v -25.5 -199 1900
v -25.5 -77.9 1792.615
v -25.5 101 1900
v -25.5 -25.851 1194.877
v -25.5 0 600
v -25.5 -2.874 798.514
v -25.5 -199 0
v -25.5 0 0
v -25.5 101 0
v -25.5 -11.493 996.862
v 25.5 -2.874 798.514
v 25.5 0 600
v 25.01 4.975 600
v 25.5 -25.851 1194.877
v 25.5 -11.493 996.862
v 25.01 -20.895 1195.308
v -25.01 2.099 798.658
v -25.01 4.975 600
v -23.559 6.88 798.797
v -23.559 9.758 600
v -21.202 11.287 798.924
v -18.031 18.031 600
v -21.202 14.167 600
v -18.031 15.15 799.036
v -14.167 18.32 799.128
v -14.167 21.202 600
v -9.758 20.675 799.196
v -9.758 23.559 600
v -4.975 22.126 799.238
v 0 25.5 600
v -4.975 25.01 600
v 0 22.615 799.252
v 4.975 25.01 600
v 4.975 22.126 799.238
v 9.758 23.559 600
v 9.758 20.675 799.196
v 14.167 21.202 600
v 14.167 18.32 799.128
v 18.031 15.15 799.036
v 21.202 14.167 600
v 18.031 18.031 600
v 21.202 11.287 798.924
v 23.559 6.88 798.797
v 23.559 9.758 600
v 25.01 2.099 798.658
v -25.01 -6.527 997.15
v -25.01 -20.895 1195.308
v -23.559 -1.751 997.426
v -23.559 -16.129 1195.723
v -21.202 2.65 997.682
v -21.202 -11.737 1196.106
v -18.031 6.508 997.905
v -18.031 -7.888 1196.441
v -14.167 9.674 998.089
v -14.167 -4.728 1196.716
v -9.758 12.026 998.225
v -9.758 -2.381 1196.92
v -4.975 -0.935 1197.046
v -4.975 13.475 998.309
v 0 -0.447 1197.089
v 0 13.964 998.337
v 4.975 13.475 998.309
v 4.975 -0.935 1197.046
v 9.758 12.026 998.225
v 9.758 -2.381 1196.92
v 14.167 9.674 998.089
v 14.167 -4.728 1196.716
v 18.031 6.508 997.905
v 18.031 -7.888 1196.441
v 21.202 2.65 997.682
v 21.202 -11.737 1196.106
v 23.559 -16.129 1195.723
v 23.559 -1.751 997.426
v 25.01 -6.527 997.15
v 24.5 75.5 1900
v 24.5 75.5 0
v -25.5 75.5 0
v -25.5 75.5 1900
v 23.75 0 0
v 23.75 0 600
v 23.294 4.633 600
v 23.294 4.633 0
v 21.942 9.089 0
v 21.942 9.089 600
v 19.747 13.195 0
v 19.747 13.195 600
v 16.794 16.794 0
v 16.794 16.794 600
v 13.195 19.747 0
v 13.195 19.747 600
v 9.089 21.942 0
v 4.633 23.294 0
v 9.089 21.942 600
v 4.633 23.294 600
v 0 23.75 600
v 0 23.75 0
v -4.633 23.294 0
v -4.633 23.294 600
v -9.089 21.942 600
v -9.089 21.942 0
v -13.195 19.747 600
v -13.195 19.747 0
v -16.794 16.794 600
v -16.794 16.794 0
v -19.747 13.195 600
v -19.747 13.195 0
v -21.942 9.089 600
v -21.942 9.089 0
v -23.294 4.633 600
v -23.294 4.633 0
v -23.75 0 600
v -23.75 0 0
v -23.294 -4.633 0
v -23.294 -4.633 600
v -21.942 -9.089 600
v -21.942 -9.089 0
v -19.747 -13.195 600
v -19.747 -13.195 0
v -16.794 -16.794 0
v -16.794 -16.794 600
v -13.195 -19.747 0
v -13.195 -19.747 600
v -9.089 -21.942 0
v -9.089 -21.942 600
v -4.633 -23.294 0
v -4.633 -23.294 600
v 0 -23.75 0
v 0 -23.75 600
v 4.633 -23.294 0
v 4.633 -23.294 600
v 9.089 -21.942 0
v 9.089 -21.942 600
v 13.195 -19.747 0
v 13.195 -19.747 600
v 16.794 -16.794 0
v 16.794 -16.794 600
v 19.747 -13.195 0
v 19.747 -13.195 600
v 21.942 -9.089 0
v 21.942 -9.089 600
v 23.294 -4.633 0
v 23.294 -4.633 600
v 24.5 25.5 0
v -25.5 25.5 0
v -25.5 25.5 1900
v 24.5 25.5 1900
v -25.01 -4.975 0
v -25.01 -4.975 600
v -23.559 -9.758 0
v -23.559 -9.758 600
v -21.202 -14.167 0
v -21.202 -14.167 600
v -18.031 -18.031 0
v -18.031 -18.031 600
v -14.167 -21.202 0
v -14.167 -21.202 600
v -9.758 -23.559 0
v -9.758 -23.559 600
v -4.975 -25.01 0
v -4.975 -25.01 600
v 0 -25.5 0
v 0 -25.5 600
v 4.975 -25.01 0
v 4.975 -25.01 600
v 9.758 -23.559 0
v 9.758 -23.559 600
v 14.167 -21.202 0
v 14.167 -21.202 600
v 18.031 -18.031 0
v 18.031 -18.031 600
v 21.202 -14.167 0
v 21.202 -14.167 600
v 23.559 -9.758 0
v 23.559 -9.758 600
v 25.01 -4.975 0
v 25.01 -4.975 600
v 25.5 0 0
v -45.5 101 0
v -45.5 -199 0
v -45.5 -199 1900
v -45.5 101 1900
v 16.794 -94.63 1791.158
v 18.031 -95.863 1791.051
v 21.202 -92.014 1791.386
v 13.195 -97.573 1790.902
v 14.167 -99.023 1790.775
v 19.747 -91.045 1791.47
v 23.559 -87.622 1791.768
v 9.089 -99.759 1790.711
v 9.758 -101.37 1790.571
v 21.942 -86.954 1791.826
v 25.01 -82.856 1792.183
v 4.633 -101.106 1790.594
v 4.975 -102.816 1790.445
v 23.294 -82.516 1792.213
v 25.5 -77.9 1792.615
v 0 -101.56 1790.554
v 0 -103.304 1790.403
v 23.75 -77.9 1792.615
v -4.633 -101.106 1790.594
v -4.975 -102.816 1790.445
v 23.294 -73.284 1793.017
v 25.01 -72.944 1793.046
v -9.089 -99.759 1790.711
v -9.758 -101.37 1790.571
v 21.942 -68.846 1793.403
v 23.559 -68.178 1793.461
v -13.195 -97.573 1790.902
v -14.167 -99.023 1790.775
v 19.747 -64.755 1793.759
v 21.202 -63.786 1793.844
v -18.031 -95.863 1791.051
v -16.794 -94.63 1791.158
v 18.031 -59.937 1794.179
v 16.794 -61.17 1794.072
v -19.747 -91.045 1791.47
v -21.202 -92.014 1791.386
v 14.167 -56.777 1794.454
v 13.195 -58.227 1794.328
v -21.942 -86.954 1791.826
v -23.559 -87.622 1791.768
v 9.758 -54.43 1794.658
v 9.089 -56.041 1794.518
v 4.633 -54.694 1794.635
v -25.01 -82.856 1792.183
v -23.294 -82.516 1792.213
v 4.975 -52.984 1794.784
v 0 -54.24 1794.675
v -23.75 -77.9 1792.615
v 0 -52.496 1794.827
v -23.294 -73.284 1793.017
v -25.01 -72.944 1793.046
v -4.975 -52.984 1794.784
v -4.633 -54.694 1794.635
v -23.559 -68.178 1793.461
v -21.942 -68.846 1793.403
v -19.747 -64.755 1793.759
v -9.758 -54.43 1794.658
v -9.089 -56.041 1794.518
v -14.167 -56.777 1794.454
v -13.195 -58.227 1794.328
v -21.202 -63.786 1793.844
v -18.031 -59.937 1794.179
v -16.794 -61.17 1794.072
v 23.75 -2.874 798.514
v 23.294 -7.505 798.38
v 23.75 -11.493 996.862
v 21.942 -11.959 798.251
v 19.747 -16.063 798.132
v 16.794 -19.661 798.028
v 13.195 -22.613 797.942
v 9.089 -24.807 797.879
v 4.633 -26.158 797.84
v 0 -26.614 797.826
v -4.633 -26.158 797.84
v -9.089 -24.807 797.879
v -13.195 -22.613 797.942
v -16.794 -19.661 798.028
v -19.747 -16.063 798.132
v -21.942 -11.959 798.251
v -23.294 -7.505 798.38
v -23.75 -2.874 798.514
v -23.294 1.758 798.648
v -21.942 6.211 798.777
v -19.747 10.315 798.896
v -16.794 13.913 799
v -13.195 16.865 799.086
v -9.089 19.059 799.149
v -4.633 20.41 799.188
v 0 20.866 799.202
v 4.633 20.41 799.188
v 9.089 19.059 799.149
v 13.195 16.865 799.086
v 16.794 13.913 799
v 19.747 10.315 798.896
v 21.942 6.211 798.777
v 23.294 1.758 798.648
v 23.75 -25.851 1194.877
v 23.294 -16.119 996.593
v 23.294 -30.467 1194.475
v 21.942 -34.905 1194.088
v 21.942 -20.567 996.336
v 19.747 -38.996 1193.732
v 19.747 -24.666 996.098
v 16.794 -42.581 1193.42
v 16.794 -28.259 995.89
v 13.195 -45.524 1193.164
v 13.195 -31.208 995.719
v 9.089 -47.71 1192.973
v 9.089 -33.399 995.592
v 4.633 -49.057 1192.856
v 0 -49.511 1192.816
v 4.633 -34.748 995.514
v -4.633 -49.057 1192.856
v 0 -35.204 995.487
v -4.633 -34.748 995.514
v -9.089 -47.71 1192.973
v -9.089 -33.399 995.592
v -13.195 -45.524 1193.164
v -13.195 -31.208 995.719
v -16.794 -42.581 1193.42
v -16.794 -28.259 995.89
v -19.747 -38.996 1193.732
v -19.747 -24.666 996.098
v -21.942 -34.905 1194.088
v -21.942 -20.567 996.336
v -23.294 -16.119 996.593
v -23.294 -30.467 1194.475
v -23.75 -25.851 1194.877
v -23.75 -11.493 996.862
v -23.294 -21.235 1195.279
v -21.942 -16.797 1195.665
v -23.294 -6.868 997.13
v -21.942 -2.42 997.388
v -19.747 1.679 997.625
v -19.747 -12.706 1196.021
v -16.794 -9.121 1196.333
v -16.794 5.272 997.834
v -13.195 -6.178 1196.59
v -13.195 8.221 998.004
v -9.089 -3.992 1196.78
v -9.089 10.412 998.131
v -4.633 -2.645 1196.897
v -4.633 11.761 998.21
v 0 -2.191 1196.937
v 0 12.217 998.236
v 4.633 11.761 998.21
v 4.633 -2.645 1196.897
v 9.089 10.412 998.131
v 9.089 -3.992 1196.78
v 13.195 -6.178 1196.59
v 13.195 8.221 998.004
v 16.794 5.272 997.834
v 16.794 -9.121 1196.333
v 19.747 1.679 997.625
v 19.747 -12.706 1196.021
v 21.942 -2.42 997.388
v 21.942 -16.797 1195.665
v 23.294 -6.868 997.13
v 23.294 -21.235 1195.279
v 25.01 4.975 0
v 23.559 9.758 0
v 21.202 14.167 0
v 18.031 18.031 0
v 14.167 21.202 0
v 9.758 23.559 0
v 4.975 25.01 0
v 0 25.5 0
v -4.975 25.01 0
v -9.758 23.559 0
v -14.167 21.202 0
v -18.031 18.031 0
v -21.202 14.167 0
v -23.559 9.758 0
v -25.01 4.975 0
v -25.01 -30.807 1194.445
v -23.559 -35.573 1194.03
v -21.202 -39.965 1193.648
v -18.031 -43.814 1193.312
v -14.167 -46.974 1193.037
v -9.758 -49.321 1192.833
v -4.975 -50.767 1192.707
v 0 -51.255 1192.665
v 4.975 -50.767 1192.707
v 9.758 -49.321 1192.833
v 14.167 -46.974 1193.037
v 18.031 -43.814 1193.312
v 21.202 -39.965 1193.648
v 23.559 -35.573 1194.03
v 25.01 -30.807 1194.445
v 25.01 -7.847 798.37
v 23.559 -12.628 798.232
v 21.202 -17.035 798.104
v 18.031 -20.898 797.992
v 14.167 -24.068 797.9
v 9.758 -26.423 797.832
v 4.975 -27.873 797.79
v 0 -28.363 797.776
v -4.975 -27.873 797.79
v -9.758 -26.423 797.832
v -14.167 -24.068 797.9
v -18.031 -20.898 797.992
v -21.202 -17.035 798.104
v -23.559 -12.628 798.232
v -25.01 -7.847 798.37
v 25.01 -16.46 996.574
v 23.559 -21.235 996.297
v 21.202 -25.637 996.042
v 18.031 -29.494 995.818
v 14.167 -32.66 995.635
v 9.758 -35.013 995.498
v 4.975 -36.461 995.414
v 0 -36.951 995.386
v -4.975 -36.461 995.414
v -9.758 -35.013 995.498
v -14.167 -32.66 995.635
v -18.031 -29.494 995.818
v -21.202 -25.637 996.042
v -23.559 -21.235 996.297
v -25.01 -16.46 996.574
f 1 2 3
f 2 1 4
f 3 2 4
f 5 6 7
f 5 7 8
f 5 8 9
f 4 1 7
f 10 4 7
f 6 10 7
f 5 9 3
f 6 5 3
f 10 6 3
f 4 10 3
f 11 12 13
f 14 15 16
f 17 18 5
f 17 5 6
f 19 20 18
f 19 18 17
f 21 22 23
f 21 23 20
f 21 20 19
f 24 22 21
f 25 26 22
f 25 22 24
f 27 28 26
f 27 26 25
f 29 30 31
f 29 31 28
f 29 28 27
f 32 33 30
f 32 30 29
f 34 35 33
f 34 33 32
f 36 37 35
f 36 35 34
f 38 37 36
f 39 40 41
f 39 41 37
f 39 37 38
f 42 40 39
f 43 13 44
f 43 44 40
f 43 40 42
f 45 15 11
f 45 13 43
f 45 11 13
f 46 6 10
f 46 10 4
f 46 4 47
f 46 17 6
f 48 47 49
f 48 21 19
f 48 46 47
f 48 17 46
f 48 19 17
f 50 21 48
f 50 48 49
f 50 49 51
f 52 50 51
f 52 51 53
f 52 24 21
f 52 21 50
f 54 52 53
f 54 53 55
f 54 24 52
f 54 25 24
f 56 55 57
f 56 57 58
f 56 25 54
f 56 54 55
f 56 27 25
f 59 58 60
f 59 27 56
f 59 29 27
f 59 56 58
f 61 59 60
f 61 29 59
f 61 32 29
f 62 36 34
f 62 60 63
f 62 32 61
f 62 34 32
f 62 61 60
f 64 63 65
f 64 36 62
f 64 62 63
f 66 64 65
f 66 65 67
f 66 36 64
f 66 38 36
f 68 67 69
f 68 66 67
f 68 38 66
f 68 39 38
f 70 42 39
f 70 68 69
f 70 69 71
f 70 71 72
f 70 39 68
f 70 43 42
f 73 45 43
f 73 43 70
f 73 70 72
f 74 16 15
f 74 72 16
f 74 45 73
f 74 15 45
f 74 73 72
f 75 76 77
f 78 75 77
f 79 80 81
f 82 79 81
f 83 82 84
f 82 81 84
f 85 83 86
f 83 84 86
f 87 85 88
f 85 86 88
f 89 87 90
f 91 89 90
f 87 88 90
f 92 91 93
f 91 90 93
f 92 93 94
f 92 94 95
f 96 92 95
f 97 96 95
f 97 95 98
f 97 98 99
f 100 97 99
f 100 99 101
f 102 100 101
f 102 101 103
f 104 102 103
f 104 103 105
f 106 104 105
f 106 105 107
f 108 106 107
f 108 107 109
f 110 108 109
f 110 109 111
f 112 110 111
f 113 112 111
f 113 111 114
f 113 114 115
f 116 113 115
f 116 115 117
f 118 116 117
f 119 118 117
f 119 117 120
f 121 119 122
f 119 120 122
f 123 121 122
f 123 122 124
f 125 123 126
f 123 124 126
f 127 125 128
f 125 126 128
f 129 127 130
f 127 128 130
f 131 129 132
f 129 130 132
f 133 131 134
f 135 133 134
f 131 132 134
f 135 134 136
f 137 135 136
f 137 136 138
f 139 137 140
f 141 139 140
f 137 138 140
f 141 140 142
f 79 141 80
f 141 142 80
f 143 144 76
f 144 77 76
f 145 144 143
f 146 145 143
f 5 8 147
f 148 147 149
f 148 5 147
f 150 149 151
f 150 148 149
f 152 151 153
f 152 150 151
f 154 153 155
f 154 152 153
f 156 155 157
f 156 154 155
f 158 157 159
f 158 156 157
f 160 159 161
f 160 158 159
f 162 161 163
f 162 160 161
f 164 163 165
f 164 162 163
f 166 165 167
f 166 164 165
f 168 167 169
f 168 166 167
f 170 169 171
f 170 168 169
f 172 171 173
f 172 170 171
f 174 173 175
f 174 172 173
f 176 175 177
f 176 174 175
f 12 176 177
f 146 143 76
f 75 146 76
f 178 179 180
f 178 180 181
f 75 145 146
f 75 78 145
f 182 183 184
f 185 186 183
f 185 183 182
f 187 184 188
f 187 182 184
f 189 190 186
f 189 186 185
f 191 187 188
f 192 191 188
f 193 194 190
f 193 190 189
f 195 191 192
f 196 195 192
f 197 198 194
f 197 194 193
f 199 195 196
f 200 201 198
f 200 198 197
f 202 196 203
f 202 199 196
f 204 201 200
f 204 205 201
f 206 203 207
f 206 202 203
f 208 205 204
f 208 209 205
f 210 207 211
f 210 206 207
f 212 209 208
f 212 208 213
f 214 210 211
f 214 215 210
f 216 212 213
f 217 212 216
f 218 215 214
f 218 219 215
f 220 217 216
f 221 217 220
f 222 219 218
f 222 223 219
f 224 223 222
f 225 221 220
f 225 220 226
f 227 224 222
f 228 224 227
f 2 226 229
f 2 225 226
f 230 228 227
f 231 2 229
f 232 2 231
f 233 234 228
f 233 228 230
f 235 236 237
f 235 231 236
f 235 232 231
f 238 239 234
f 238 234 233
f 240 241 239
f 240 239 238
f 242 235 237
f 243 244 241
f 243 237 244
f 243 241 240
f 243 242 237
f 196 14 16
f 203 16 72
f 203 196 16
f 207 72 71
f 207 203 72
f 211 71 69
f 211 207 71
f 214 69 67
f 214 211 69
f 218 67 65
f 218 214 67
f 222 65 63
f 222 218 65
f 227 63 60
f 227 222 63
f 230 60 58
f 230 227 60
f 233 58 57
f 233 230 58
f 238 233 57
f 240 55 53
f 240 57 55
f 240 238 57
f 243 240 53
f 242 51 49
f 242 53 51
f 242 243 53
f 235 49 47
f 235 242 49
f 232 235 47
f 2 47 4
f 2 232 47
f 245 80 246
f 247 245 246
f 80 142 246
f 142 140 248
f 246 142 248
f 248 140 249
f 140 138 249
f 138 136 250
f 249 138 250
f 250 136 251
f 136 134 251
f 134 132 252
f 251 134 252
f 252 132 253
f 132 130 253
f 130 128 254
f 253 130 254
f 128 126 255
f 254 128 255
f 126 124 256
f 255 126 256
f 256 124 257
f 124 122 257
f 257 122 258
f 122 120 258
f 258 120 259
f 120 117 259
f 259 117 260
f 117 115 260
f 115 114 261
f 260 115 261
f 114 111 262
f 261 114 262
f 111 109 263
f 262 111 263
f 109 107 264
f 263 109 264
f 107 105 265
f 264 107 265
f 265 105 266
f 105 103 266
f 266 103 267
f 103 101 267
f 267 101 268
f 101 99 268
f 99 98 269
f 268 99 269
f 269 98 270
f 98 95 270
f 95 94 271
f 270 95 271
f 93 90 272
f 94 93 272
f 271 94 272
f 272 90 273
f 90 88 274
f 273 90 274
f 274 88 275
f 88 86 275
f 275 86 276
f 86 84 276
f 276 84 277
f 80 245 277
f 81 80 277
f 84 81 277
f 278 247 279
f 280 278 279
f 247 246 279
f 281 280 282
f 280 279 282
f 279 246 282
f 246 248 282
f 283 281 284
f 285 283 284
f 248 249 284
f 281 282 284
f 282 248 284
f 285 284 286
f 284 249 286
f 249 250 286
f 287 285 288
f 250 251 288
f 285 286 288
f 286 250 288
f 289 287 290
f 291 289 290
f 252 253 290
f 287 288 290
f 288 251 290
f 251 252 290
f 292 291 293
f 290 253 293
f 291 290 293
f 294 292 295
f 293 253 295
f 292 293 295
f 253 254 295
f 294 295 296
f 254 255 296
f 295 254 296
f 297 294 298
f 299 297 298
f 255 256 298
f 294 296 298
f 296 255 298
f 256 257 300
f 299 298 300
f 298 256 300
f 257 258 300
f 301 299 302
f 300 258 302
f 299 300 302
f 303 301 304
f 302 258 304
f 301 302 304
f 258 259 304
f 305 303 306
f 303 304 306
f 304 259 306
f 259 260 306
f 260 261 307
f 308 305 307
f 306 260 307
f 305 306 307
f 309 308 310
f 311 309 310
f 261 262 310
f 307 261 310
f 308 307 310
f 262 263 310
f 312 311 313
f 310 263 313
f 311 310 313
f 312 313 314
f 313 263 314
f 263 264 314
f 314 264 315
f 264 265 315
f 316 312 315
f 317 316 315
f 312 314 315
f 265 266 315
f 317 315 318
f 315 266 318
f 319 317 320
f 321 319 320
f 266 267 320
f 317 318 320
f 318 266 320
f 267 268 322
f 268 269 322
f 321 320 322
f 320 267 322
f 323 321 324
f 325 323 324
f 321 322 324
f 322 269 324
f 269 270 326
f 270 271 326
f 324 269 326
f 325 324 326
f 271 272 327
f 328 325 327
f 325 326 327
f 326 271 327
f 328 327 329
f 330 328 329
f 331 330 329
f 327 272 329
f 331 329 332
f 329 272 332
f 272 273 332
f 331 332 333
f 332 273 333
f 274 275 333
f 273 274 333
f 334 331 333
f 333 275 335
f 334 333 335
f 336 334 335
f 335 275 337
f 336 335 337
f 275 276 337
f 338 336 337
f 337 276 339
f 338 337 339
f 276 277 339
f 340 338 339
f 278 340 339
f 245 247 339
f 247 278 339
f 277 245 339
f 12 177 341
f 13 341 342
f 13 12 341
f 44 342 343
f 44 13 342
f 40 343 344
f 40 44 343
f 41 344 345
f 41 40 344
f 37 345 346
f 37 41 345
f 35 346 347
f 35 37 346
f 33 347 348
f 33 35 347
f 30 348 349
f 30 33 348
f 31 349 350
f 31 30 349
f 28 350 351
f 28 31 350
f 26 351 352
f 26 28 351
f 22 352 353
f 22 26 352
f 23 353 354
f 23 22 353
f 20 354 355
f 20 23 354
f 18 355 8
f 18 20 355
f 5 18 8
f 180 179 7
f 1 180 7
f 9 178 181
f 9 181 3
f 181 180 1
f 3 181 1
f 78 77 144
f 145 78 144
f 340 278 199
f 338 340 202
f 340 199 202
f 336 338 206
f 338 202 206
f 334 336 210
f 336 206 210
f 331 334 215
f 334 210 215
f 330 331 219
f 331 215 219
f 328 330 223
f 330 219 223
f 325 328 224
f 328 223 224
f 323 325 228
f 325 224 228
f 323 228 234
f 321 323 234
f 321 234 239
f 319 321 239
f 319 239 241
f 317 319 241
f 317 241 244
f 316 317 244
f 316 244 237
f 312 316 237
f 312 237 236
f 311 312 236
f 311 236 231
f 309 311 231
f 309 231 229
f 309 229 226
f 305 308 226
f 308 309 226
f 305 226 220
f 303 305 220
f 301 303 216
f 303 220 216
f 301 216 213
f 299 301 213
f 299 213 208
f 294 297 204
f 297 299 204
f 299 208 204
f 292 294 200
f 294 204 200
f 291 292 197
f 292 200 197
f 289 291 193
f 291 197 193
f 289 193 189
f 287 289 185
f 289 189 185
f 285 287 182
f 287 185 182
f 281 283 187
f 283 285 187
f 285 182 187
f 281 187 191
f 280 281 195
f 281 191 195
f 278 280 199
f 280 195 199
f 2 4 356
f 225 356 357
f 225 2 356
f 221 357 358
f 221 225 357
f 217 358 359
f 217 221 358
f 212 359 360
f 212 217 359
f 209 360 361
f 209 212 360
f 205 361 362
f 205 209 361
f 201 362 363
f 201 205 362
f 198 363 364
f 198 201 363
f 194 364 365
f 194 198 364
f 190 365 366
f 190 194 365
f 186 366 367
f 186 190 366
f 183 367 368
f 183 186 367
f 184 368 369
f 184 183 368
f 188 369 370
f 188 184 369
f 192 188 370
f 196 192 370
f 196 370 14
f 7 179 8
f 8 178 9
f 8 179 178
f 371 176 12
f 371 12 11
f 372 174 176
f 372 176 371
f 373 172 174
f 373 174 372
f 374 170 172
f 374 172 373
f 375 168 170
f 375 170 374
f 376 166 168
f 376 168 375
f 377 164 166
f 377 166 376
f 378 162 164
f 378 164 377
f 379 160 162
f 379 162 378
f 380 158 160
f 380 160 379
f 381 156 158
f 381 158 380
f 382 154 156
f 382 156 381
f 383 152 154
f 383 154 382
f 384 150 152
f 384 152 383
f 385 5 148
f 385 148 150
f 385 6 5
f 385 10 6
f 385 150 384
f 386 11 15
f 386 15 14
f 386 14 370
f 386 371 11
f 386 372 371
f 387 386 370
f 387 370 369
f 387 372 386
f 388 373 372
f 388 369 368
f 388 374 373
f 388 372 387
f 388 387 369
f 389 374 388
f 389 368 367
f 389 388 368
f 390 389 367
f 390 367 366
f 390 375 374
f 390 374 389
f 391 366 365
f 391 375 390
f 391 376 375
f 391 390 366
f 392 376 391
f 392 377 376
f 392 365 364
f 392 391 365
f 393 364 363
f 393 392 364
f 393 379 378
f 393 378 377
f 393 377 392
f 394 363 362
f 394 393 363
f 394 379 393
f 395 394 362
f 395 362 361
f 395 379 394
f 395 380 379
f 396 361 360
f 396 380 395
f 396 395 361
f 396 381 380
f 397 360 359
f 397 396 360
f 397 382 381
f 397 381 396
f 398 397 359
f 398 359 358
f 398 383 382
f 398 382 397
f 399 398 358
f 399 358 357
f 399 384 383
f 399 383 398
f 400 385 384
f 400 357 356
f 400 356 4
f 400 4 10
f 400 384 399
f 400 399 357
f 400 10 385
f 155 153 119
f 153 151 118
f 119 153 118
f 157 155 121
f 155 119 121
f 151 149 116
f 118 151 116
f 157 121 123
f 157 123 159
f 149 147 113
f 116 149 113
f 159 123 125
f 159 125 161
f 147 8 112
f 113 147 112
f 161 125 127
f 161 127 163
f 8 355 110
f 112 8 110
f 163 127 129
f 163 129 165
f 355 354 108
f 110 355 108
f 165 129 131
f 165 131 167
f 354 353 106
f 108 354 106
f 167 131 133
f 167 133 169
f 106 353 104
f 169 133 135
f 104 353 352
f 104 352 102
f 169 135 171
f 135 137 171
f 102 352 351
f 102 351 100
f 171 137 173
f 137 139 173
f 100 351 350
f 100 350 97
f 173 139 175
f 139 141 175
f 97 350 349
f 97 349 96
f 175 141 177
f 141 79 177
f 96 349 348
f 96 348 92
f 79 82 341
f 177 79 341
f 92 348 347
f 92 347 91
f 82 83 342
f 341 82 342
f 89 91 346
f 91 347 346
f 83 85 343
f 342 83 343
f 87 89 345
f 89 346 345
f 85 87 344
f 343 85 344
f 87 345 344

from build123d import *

# Parameters (mm, degrees)
F0_R     = 25.5
F0_R_2   = 23.75
F3_W     = 20
F3_H     = 300
F4_DEPTH = 1900
F7_DEPTH = 1900


with BuildPart() as f2:
    # F2: sweep along a path in F1
    with BuildLine(Plane.YZ) as f2_path:
        Line((0, 0), (0, 600))
        ThreePointArc((0, 600), (-6.4657987929, 897.7190217698), (-25.8510022272, 1194.8766169368))
        Line((-25.8510022272, 1194.8766169368), (-77.9, 1792.6147718432))
    # F0 (on Top) → F2 (sweep)
    with BuildSketch(Plane.XY):
        Circle(F0_R)
        Circle(F0_R_2, mode=Mode.SUBTRACT)
    sweep(path=f2_path.line)

    # F3 (on Top) → F4 (join)
    with BuildSketch(Plane.XY):
        with Locations((-35.5, -49)):
            Rectangle(F3_W, F3_H)
    extrude(amount=F4_DEPTH)


with BuildPart() as f7:
    # F6 (on Top) → F7 (new body)
    with BuildSketch(Plane.XY):
        Polygon((-25.5, 25.5), (0, 25.5), (24.5, 25.5), (24.5, 75.5), (-25.5, 75.5), align=None)
    extrude(amount=F7_DEPTH)


solid = Compound([f2.part, f7.part])
